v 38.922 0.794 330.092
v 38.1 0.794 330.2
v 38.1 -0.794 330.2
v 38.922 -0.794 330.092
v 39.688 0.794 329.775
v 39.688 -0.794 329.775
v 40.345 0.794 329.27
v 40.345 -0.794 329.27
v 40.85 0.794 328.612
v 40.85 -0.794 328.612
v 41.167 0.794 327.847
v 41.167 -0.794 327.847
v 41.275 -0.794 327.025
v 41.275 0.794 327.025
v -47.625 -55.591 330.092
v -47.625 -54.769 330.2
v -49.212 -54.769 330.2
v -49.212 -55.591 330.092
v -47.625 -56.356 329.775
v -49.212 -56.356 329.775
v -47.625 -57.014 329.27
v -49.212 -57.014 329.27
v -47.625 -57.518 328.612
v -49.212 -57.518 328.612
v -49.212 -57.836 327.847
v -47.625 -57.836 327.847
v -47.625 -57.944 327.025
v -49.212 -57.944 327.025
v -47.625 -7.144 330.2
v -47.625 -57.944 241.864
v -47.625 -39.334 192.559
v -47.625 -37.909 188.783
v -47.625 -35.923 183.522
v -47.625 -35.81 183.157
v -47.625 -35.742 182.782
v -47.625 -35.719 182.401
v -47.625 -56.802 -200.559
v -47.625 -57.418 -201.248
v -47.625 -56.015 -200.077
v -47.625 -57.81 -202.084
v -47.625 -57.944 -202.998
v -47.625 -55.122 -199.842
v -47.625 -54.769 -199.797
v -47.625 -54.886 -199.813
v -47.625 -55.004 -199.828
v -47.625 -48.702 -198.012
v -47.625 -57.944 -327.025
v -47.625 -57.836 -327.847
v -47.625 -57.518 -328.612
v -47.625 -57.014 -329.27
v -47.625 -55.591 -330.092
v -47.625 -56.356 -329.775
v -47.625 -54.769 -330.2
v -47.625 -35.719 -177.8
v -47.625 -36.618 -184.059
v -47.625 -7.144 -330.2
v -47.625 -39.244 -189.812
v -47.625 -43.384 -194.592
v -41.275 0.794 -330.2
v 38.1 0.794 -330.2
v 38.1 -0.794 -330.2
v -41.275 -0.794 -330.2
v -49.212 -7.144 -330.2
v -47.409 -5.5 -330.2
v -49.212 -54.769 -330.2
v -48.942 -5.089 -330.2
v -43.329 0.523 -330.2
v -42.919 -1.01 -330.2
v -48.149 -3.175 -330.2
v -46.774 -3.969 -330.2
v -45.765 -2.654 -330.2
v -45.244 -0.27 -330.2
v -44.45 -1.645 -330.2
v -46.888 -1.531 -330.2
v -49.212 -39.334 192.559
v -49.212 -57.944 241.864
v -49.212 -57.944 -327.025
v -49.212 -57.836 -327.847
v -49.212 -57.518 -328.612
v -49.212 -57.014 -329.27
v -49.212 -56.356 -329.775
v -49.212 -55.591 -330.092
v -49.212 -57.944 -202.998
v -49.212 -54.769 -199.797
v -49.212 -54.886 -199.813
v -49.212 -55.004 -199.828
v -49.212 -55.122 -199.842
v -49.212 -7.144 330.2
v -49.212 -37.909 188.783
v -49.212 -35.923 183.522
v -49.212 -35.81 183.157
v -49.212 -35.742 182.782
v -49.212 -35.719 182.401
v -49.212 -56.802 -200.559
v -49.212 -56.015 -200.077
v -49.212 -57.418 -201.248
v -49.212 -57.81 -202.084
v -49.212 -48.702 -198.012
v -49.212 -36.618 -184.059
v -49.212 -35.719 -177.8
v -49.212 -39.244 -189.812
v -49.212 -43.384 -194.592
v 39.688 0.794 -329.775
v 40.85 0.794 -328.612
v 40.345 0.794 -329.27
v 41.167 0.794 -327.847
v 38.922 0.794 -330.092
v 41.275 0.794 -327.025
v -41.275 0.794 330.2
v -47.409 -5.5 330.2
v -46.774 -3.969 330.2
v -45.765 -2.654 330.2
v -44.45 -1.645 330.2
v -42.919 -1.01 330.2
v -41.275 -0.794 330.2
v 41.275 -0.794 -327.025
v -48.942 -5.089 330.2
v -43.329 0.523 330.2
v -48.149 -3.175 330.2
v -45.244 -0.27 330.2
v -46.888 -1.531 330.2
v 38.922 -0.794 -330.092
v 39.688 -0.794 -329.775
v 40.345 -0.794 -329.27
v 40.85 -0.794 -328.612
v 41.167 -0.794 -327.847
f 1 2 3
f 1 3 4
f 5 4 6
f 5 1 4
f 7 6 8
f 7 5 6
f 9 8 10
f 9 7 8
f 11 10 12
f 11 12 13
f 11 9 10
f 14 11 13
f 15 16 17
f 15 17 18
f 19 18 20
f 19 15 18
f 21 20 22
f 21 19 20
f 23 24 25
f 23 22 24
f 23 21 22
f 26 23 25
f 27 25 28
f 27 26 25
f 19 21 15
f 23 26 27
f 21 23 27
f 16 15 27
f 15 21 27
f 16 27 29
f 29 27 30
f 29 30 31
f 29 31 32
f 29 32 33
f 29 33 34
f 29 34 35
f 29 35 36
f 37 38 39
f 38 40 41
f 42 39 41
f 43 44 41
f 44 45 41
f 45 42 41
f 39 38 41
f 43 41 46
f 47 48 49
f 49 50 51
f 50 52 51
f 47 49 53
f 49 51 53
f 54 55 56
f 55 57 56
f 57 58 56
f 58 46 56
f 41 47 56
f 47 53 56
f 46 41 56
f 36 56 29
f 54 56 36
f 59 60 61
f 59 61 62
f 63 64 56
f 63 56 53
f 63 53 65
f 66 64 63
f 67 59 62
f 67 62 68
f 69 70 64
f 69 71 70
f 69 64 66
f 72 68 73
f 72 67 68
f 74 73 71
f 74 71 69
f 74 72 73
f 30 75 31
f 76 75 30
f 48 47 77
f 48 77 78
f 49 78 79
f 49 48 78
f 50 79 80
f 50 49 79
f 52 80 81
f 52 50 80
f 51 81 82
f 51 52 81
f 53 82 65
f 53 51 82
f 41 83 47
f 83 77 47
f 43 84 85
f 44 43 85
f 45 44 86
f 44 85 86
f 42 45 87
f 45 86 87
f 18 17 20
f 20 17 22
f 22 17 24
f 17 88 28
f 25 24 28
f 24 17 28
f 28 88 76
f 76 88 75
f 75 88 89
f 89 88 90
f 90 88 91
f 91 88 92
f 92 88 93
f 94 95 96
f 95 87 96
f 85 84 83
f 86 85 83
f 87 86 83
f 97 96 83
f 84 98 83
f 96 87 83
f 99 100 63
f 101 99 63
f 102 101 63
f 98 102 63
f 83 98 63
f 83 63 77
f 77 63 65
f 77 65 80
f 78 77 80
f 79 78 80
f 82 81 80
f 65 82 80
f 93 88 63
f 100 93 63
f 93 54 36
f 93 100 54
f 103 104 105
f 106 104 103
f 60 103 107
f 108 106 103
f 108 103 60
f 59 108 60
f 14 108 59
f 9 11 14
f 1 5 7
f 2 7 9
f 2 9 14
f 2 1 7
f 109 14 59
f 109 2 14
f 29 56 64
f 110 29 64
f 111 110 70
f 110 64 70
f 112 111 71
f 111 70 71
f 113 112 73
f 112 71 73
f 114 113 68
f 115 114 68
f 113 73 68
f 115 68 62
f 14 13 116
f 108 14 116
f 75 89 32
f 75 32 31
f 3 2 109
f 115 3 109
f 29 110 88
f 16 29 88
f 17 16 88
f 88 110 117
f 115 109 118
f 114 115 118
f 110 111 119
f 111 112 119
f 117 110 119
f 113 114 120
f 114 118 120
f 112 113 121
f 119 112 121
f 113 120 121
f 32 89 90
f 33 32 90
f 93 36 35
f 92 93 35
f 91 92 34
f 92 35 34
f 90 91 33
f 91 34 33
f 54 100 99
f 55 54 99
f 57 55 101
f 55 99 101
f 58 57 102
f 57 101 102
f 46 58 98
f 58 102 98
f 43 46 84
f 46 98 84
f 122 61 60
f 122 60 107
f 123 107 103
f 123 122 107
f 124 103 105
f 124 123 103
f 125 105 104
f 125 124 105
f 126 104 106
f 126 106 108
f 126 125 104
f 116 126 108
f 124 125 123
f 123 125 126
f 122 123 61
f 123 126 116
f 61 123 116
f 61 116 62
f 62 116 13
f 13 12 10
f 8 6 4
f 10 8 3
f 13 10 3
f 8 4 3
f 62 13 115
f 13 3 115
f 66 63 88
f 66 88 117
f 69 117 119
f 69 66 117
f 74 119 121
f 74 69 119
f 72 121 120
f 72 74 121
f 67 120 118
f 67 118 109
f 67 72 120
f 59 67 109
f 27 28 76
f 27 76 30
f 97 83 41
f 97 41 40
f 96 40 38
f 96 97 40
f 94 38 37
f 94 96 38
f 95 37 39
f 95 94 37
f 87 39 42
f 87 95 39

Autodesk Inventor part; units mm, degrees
ref_plane "YZ Plane" through (0, 0, 0) normal (1, 0, 0) x (0, 1, 0)
ref_plane "XZ Plane" through (0, 0, 0) normal (0, 1, 0) x (-1, 0, 0)
ref_plane "XY Plane" through (0, 0, 0) normal (0, 0, 1) x (1, 0, 0)
sketch "Sketch1" plane through (0, 0, 0) normal (0, 1, 0) x (-1, 0, 0)
  line L0 (41.275, 330.2) -> (-41.275, 330.2)
  line L1 (-41.275, 330.2) -> (-41.275, -330.2)
  line L2 (-41.275, -330.2) -> (41.275, -330.2)
  line L3 (41.275, -330.2) -> (41.275, 330.2)
  line L4 (41.275, 330.2) -> (-41.275, -330.2) construction
  line L5 (-41.275, 330.2) -> (41.275, -330.2) construction
  point P0 (0, 0)
  dimension "d0" = 82.55
  dimension "d1" = 660.4
extrude "Extrusion1" add sketch "Sketch1" along normal mid plane 1.5875
sketch "Sketch2" plane through (41.275, 0.7937, -330.2) normal (0, 0, -1) x (-1, 0, 0)
  line L0 (90.4875, -7.9375) -> (90.4875, -58.7375)
  line L1 (90.4875, -58.7375) -> (88.9, -58.7375)
  line L2 (88.9, -58.7375) -> (88.9, -7.9375)
  arc A0 (88.9, -7.9375) -> (82.55, -1.5875) centre (82.55, -7.9375) ccw
  line L3 (82.55, -1.5875) -> (82.55, 0)
  arc A1 (90.4875, -7.9375) -> (82.55, 0) centre (82.55, -7.9375) ccw
  point P0 (41.275, -0.7937)
  dimension "d4" = 6.35
  dimension "d5" = 57.15
  dimension "d6" = 1.5875
extrude "Extrusion2" add sketch "Sketch2" against normal blind 660.4
sketch "Sketch3" plane through (-49.2125, -57.9438, -330.2) normal (-1, 0, 0) x (0, 0, 1)
  arc A0 (518.9985, 0) -> (520.5697, 1.8143) centre (518.9985, 1.5875) ccw projected
  arc A1 (520.5697, 1.8143) -> (508, 12.7) centre (508, 0) ccw projected
  line L0 (497.2617, 12.7) -> (508, 12.7) projected
  line L1 (413.9219, 12.7) -> (497.2617, 12.7) projected
  line L2 (330.2, 12.7) -> (413.9219, 12.7) projected
  line L3 (226.8601, 12.7) -> (330.2, 12.7) projected
  line L4 (158.6559, 12.7) -> (226.8601, 12.7) projected
  line L5 (152.4, 12.7) -> (158.6559, 12.7) projected
  arc A2 (152.4, 12.7) -> (139.8303, 1.8143) centre (152.4, 0) ccw projected
  arc A3 (139.8303, 1.8143) -> (141.4015, 0) centre (141.4015, 1.5875) ccw projected
  line L6 (518.9985, 0) -> (141.4015, 0) projected
  line L7 (497.2617, 22.225) -> (508, 22.225)
  arc A4 (529.997, 3.175) -> (508, 22.225) centre (508, 0) ccw
  arc A5 (518.9985, -9.525) -> (529.997, 3.175) centre (518.9985, 1.5875) ccw
  line L8 (518.9985, -9.525) -> (141.4015, -9.525)
  arc A6 (130.403, 3.175) -> (141.4015, -9.525) centre (141.4015, 1.5875) ccw
  arc A7 (152.4, 22.225) -> (130.403, 3.175) centre (152.4, 0) ccw
  line L9 (152.4, 22.225) -> (158.6559, 22.225)
  line L10 (158.6559, 22.225) -> (226.8601, 22.225)
  line L11 (226.8601, 22.225) -> (330.2, 22.225)
  line L12 (330.2, 22.225) -> (413.9219, 22.225)
  line L13 (413.9219, 22.225) -> (497.2617, 22.225)
  point P0 (330.2, 57.9438)
  dimension "d9" = 9.525
extrude "Extrusion3" cut sketch "Sketch3" against normal up to surface (1.5875 mm away) contours L6 A3 A2 L5 L4 L3 L2 L1 L0 A1 A0 | L7 A4 A5 L8 A6 A7 L9 L10 L11 L12 L13
sketch "Sketch5" plane through (-49.2125, -57.9438, -330.2) normal (-1, 0, 0) x (0, 0, 1)
  line L0 (515.6192, 11.1235) -> (519.405, 9.6946) projected
  line L1 (518.9828, 20.0348) -> (522.7587, 18.6096)
  line L2 (518.9828, 20.0348) -> (513.1799, 22.225)
  line L3 (513.1799, 22.225) -> (508, 22.225)
  arc A0 (529.997, 3.175) -> (508, 22.225) centre (508, 0) ccw projected
  line L4 (522.7587, 18.6096) -> (572.0643, 0)
  line L5 (529.997, 0) -> (660.4, 0) projected
  arc A1 (130.403, 3.175) -> (130.403, 0) centre (141.4015, 1.5875) ccw projected
  arc A2 (152.4, 22.225) -> (130.403, 3.175) centre (152.4, 0) ccw projected
  line L6 (152.4, 22.225) -> (508, 22.225) projected
  arc A3 (529.997, 3.175) -> (508, 22.225) centre (508, 0) ccw projected
  arc A4 (529.997, 0) -> (529.997, 3.175) centre (518.9985, 1.5875) ccw projected
  line L7 (529.997, 0) -> (660.4, 0) projected
  line L8 (660.4, 50.8) -> (660.4, 0) projected
  line L9 (0, 50.8) -> (660.4, 50.8) projected
  line L10 (0, 0) -> (0, 50.8) projected
  line L11 (0, 0) -> (130.403, 0) projected
  point P0 (330.2, 57.9438)
  dimension "d12" = 9.525
extrude "Extrusion4" cut sketch "Sketch5" against normal up to surface (1.5875 mm away) contours L1 L4 L5 A4 A0 L3 L2
fillet "Fillet1" radius 3.175 2 edges at (-48.4188, -57.9438, -199.797) (-48.4188, -35.7187, 182.9799)
fillet "Fillet2" radius 3.175 4 edges at (-48.4188, -57.9438, -330.2) (41.275, 0, -330.2) (-48.4188, -57.9438, 330.2) (41.275, 0, 330.2)
properties part number "TopPlate" material "ABS Plastic"
